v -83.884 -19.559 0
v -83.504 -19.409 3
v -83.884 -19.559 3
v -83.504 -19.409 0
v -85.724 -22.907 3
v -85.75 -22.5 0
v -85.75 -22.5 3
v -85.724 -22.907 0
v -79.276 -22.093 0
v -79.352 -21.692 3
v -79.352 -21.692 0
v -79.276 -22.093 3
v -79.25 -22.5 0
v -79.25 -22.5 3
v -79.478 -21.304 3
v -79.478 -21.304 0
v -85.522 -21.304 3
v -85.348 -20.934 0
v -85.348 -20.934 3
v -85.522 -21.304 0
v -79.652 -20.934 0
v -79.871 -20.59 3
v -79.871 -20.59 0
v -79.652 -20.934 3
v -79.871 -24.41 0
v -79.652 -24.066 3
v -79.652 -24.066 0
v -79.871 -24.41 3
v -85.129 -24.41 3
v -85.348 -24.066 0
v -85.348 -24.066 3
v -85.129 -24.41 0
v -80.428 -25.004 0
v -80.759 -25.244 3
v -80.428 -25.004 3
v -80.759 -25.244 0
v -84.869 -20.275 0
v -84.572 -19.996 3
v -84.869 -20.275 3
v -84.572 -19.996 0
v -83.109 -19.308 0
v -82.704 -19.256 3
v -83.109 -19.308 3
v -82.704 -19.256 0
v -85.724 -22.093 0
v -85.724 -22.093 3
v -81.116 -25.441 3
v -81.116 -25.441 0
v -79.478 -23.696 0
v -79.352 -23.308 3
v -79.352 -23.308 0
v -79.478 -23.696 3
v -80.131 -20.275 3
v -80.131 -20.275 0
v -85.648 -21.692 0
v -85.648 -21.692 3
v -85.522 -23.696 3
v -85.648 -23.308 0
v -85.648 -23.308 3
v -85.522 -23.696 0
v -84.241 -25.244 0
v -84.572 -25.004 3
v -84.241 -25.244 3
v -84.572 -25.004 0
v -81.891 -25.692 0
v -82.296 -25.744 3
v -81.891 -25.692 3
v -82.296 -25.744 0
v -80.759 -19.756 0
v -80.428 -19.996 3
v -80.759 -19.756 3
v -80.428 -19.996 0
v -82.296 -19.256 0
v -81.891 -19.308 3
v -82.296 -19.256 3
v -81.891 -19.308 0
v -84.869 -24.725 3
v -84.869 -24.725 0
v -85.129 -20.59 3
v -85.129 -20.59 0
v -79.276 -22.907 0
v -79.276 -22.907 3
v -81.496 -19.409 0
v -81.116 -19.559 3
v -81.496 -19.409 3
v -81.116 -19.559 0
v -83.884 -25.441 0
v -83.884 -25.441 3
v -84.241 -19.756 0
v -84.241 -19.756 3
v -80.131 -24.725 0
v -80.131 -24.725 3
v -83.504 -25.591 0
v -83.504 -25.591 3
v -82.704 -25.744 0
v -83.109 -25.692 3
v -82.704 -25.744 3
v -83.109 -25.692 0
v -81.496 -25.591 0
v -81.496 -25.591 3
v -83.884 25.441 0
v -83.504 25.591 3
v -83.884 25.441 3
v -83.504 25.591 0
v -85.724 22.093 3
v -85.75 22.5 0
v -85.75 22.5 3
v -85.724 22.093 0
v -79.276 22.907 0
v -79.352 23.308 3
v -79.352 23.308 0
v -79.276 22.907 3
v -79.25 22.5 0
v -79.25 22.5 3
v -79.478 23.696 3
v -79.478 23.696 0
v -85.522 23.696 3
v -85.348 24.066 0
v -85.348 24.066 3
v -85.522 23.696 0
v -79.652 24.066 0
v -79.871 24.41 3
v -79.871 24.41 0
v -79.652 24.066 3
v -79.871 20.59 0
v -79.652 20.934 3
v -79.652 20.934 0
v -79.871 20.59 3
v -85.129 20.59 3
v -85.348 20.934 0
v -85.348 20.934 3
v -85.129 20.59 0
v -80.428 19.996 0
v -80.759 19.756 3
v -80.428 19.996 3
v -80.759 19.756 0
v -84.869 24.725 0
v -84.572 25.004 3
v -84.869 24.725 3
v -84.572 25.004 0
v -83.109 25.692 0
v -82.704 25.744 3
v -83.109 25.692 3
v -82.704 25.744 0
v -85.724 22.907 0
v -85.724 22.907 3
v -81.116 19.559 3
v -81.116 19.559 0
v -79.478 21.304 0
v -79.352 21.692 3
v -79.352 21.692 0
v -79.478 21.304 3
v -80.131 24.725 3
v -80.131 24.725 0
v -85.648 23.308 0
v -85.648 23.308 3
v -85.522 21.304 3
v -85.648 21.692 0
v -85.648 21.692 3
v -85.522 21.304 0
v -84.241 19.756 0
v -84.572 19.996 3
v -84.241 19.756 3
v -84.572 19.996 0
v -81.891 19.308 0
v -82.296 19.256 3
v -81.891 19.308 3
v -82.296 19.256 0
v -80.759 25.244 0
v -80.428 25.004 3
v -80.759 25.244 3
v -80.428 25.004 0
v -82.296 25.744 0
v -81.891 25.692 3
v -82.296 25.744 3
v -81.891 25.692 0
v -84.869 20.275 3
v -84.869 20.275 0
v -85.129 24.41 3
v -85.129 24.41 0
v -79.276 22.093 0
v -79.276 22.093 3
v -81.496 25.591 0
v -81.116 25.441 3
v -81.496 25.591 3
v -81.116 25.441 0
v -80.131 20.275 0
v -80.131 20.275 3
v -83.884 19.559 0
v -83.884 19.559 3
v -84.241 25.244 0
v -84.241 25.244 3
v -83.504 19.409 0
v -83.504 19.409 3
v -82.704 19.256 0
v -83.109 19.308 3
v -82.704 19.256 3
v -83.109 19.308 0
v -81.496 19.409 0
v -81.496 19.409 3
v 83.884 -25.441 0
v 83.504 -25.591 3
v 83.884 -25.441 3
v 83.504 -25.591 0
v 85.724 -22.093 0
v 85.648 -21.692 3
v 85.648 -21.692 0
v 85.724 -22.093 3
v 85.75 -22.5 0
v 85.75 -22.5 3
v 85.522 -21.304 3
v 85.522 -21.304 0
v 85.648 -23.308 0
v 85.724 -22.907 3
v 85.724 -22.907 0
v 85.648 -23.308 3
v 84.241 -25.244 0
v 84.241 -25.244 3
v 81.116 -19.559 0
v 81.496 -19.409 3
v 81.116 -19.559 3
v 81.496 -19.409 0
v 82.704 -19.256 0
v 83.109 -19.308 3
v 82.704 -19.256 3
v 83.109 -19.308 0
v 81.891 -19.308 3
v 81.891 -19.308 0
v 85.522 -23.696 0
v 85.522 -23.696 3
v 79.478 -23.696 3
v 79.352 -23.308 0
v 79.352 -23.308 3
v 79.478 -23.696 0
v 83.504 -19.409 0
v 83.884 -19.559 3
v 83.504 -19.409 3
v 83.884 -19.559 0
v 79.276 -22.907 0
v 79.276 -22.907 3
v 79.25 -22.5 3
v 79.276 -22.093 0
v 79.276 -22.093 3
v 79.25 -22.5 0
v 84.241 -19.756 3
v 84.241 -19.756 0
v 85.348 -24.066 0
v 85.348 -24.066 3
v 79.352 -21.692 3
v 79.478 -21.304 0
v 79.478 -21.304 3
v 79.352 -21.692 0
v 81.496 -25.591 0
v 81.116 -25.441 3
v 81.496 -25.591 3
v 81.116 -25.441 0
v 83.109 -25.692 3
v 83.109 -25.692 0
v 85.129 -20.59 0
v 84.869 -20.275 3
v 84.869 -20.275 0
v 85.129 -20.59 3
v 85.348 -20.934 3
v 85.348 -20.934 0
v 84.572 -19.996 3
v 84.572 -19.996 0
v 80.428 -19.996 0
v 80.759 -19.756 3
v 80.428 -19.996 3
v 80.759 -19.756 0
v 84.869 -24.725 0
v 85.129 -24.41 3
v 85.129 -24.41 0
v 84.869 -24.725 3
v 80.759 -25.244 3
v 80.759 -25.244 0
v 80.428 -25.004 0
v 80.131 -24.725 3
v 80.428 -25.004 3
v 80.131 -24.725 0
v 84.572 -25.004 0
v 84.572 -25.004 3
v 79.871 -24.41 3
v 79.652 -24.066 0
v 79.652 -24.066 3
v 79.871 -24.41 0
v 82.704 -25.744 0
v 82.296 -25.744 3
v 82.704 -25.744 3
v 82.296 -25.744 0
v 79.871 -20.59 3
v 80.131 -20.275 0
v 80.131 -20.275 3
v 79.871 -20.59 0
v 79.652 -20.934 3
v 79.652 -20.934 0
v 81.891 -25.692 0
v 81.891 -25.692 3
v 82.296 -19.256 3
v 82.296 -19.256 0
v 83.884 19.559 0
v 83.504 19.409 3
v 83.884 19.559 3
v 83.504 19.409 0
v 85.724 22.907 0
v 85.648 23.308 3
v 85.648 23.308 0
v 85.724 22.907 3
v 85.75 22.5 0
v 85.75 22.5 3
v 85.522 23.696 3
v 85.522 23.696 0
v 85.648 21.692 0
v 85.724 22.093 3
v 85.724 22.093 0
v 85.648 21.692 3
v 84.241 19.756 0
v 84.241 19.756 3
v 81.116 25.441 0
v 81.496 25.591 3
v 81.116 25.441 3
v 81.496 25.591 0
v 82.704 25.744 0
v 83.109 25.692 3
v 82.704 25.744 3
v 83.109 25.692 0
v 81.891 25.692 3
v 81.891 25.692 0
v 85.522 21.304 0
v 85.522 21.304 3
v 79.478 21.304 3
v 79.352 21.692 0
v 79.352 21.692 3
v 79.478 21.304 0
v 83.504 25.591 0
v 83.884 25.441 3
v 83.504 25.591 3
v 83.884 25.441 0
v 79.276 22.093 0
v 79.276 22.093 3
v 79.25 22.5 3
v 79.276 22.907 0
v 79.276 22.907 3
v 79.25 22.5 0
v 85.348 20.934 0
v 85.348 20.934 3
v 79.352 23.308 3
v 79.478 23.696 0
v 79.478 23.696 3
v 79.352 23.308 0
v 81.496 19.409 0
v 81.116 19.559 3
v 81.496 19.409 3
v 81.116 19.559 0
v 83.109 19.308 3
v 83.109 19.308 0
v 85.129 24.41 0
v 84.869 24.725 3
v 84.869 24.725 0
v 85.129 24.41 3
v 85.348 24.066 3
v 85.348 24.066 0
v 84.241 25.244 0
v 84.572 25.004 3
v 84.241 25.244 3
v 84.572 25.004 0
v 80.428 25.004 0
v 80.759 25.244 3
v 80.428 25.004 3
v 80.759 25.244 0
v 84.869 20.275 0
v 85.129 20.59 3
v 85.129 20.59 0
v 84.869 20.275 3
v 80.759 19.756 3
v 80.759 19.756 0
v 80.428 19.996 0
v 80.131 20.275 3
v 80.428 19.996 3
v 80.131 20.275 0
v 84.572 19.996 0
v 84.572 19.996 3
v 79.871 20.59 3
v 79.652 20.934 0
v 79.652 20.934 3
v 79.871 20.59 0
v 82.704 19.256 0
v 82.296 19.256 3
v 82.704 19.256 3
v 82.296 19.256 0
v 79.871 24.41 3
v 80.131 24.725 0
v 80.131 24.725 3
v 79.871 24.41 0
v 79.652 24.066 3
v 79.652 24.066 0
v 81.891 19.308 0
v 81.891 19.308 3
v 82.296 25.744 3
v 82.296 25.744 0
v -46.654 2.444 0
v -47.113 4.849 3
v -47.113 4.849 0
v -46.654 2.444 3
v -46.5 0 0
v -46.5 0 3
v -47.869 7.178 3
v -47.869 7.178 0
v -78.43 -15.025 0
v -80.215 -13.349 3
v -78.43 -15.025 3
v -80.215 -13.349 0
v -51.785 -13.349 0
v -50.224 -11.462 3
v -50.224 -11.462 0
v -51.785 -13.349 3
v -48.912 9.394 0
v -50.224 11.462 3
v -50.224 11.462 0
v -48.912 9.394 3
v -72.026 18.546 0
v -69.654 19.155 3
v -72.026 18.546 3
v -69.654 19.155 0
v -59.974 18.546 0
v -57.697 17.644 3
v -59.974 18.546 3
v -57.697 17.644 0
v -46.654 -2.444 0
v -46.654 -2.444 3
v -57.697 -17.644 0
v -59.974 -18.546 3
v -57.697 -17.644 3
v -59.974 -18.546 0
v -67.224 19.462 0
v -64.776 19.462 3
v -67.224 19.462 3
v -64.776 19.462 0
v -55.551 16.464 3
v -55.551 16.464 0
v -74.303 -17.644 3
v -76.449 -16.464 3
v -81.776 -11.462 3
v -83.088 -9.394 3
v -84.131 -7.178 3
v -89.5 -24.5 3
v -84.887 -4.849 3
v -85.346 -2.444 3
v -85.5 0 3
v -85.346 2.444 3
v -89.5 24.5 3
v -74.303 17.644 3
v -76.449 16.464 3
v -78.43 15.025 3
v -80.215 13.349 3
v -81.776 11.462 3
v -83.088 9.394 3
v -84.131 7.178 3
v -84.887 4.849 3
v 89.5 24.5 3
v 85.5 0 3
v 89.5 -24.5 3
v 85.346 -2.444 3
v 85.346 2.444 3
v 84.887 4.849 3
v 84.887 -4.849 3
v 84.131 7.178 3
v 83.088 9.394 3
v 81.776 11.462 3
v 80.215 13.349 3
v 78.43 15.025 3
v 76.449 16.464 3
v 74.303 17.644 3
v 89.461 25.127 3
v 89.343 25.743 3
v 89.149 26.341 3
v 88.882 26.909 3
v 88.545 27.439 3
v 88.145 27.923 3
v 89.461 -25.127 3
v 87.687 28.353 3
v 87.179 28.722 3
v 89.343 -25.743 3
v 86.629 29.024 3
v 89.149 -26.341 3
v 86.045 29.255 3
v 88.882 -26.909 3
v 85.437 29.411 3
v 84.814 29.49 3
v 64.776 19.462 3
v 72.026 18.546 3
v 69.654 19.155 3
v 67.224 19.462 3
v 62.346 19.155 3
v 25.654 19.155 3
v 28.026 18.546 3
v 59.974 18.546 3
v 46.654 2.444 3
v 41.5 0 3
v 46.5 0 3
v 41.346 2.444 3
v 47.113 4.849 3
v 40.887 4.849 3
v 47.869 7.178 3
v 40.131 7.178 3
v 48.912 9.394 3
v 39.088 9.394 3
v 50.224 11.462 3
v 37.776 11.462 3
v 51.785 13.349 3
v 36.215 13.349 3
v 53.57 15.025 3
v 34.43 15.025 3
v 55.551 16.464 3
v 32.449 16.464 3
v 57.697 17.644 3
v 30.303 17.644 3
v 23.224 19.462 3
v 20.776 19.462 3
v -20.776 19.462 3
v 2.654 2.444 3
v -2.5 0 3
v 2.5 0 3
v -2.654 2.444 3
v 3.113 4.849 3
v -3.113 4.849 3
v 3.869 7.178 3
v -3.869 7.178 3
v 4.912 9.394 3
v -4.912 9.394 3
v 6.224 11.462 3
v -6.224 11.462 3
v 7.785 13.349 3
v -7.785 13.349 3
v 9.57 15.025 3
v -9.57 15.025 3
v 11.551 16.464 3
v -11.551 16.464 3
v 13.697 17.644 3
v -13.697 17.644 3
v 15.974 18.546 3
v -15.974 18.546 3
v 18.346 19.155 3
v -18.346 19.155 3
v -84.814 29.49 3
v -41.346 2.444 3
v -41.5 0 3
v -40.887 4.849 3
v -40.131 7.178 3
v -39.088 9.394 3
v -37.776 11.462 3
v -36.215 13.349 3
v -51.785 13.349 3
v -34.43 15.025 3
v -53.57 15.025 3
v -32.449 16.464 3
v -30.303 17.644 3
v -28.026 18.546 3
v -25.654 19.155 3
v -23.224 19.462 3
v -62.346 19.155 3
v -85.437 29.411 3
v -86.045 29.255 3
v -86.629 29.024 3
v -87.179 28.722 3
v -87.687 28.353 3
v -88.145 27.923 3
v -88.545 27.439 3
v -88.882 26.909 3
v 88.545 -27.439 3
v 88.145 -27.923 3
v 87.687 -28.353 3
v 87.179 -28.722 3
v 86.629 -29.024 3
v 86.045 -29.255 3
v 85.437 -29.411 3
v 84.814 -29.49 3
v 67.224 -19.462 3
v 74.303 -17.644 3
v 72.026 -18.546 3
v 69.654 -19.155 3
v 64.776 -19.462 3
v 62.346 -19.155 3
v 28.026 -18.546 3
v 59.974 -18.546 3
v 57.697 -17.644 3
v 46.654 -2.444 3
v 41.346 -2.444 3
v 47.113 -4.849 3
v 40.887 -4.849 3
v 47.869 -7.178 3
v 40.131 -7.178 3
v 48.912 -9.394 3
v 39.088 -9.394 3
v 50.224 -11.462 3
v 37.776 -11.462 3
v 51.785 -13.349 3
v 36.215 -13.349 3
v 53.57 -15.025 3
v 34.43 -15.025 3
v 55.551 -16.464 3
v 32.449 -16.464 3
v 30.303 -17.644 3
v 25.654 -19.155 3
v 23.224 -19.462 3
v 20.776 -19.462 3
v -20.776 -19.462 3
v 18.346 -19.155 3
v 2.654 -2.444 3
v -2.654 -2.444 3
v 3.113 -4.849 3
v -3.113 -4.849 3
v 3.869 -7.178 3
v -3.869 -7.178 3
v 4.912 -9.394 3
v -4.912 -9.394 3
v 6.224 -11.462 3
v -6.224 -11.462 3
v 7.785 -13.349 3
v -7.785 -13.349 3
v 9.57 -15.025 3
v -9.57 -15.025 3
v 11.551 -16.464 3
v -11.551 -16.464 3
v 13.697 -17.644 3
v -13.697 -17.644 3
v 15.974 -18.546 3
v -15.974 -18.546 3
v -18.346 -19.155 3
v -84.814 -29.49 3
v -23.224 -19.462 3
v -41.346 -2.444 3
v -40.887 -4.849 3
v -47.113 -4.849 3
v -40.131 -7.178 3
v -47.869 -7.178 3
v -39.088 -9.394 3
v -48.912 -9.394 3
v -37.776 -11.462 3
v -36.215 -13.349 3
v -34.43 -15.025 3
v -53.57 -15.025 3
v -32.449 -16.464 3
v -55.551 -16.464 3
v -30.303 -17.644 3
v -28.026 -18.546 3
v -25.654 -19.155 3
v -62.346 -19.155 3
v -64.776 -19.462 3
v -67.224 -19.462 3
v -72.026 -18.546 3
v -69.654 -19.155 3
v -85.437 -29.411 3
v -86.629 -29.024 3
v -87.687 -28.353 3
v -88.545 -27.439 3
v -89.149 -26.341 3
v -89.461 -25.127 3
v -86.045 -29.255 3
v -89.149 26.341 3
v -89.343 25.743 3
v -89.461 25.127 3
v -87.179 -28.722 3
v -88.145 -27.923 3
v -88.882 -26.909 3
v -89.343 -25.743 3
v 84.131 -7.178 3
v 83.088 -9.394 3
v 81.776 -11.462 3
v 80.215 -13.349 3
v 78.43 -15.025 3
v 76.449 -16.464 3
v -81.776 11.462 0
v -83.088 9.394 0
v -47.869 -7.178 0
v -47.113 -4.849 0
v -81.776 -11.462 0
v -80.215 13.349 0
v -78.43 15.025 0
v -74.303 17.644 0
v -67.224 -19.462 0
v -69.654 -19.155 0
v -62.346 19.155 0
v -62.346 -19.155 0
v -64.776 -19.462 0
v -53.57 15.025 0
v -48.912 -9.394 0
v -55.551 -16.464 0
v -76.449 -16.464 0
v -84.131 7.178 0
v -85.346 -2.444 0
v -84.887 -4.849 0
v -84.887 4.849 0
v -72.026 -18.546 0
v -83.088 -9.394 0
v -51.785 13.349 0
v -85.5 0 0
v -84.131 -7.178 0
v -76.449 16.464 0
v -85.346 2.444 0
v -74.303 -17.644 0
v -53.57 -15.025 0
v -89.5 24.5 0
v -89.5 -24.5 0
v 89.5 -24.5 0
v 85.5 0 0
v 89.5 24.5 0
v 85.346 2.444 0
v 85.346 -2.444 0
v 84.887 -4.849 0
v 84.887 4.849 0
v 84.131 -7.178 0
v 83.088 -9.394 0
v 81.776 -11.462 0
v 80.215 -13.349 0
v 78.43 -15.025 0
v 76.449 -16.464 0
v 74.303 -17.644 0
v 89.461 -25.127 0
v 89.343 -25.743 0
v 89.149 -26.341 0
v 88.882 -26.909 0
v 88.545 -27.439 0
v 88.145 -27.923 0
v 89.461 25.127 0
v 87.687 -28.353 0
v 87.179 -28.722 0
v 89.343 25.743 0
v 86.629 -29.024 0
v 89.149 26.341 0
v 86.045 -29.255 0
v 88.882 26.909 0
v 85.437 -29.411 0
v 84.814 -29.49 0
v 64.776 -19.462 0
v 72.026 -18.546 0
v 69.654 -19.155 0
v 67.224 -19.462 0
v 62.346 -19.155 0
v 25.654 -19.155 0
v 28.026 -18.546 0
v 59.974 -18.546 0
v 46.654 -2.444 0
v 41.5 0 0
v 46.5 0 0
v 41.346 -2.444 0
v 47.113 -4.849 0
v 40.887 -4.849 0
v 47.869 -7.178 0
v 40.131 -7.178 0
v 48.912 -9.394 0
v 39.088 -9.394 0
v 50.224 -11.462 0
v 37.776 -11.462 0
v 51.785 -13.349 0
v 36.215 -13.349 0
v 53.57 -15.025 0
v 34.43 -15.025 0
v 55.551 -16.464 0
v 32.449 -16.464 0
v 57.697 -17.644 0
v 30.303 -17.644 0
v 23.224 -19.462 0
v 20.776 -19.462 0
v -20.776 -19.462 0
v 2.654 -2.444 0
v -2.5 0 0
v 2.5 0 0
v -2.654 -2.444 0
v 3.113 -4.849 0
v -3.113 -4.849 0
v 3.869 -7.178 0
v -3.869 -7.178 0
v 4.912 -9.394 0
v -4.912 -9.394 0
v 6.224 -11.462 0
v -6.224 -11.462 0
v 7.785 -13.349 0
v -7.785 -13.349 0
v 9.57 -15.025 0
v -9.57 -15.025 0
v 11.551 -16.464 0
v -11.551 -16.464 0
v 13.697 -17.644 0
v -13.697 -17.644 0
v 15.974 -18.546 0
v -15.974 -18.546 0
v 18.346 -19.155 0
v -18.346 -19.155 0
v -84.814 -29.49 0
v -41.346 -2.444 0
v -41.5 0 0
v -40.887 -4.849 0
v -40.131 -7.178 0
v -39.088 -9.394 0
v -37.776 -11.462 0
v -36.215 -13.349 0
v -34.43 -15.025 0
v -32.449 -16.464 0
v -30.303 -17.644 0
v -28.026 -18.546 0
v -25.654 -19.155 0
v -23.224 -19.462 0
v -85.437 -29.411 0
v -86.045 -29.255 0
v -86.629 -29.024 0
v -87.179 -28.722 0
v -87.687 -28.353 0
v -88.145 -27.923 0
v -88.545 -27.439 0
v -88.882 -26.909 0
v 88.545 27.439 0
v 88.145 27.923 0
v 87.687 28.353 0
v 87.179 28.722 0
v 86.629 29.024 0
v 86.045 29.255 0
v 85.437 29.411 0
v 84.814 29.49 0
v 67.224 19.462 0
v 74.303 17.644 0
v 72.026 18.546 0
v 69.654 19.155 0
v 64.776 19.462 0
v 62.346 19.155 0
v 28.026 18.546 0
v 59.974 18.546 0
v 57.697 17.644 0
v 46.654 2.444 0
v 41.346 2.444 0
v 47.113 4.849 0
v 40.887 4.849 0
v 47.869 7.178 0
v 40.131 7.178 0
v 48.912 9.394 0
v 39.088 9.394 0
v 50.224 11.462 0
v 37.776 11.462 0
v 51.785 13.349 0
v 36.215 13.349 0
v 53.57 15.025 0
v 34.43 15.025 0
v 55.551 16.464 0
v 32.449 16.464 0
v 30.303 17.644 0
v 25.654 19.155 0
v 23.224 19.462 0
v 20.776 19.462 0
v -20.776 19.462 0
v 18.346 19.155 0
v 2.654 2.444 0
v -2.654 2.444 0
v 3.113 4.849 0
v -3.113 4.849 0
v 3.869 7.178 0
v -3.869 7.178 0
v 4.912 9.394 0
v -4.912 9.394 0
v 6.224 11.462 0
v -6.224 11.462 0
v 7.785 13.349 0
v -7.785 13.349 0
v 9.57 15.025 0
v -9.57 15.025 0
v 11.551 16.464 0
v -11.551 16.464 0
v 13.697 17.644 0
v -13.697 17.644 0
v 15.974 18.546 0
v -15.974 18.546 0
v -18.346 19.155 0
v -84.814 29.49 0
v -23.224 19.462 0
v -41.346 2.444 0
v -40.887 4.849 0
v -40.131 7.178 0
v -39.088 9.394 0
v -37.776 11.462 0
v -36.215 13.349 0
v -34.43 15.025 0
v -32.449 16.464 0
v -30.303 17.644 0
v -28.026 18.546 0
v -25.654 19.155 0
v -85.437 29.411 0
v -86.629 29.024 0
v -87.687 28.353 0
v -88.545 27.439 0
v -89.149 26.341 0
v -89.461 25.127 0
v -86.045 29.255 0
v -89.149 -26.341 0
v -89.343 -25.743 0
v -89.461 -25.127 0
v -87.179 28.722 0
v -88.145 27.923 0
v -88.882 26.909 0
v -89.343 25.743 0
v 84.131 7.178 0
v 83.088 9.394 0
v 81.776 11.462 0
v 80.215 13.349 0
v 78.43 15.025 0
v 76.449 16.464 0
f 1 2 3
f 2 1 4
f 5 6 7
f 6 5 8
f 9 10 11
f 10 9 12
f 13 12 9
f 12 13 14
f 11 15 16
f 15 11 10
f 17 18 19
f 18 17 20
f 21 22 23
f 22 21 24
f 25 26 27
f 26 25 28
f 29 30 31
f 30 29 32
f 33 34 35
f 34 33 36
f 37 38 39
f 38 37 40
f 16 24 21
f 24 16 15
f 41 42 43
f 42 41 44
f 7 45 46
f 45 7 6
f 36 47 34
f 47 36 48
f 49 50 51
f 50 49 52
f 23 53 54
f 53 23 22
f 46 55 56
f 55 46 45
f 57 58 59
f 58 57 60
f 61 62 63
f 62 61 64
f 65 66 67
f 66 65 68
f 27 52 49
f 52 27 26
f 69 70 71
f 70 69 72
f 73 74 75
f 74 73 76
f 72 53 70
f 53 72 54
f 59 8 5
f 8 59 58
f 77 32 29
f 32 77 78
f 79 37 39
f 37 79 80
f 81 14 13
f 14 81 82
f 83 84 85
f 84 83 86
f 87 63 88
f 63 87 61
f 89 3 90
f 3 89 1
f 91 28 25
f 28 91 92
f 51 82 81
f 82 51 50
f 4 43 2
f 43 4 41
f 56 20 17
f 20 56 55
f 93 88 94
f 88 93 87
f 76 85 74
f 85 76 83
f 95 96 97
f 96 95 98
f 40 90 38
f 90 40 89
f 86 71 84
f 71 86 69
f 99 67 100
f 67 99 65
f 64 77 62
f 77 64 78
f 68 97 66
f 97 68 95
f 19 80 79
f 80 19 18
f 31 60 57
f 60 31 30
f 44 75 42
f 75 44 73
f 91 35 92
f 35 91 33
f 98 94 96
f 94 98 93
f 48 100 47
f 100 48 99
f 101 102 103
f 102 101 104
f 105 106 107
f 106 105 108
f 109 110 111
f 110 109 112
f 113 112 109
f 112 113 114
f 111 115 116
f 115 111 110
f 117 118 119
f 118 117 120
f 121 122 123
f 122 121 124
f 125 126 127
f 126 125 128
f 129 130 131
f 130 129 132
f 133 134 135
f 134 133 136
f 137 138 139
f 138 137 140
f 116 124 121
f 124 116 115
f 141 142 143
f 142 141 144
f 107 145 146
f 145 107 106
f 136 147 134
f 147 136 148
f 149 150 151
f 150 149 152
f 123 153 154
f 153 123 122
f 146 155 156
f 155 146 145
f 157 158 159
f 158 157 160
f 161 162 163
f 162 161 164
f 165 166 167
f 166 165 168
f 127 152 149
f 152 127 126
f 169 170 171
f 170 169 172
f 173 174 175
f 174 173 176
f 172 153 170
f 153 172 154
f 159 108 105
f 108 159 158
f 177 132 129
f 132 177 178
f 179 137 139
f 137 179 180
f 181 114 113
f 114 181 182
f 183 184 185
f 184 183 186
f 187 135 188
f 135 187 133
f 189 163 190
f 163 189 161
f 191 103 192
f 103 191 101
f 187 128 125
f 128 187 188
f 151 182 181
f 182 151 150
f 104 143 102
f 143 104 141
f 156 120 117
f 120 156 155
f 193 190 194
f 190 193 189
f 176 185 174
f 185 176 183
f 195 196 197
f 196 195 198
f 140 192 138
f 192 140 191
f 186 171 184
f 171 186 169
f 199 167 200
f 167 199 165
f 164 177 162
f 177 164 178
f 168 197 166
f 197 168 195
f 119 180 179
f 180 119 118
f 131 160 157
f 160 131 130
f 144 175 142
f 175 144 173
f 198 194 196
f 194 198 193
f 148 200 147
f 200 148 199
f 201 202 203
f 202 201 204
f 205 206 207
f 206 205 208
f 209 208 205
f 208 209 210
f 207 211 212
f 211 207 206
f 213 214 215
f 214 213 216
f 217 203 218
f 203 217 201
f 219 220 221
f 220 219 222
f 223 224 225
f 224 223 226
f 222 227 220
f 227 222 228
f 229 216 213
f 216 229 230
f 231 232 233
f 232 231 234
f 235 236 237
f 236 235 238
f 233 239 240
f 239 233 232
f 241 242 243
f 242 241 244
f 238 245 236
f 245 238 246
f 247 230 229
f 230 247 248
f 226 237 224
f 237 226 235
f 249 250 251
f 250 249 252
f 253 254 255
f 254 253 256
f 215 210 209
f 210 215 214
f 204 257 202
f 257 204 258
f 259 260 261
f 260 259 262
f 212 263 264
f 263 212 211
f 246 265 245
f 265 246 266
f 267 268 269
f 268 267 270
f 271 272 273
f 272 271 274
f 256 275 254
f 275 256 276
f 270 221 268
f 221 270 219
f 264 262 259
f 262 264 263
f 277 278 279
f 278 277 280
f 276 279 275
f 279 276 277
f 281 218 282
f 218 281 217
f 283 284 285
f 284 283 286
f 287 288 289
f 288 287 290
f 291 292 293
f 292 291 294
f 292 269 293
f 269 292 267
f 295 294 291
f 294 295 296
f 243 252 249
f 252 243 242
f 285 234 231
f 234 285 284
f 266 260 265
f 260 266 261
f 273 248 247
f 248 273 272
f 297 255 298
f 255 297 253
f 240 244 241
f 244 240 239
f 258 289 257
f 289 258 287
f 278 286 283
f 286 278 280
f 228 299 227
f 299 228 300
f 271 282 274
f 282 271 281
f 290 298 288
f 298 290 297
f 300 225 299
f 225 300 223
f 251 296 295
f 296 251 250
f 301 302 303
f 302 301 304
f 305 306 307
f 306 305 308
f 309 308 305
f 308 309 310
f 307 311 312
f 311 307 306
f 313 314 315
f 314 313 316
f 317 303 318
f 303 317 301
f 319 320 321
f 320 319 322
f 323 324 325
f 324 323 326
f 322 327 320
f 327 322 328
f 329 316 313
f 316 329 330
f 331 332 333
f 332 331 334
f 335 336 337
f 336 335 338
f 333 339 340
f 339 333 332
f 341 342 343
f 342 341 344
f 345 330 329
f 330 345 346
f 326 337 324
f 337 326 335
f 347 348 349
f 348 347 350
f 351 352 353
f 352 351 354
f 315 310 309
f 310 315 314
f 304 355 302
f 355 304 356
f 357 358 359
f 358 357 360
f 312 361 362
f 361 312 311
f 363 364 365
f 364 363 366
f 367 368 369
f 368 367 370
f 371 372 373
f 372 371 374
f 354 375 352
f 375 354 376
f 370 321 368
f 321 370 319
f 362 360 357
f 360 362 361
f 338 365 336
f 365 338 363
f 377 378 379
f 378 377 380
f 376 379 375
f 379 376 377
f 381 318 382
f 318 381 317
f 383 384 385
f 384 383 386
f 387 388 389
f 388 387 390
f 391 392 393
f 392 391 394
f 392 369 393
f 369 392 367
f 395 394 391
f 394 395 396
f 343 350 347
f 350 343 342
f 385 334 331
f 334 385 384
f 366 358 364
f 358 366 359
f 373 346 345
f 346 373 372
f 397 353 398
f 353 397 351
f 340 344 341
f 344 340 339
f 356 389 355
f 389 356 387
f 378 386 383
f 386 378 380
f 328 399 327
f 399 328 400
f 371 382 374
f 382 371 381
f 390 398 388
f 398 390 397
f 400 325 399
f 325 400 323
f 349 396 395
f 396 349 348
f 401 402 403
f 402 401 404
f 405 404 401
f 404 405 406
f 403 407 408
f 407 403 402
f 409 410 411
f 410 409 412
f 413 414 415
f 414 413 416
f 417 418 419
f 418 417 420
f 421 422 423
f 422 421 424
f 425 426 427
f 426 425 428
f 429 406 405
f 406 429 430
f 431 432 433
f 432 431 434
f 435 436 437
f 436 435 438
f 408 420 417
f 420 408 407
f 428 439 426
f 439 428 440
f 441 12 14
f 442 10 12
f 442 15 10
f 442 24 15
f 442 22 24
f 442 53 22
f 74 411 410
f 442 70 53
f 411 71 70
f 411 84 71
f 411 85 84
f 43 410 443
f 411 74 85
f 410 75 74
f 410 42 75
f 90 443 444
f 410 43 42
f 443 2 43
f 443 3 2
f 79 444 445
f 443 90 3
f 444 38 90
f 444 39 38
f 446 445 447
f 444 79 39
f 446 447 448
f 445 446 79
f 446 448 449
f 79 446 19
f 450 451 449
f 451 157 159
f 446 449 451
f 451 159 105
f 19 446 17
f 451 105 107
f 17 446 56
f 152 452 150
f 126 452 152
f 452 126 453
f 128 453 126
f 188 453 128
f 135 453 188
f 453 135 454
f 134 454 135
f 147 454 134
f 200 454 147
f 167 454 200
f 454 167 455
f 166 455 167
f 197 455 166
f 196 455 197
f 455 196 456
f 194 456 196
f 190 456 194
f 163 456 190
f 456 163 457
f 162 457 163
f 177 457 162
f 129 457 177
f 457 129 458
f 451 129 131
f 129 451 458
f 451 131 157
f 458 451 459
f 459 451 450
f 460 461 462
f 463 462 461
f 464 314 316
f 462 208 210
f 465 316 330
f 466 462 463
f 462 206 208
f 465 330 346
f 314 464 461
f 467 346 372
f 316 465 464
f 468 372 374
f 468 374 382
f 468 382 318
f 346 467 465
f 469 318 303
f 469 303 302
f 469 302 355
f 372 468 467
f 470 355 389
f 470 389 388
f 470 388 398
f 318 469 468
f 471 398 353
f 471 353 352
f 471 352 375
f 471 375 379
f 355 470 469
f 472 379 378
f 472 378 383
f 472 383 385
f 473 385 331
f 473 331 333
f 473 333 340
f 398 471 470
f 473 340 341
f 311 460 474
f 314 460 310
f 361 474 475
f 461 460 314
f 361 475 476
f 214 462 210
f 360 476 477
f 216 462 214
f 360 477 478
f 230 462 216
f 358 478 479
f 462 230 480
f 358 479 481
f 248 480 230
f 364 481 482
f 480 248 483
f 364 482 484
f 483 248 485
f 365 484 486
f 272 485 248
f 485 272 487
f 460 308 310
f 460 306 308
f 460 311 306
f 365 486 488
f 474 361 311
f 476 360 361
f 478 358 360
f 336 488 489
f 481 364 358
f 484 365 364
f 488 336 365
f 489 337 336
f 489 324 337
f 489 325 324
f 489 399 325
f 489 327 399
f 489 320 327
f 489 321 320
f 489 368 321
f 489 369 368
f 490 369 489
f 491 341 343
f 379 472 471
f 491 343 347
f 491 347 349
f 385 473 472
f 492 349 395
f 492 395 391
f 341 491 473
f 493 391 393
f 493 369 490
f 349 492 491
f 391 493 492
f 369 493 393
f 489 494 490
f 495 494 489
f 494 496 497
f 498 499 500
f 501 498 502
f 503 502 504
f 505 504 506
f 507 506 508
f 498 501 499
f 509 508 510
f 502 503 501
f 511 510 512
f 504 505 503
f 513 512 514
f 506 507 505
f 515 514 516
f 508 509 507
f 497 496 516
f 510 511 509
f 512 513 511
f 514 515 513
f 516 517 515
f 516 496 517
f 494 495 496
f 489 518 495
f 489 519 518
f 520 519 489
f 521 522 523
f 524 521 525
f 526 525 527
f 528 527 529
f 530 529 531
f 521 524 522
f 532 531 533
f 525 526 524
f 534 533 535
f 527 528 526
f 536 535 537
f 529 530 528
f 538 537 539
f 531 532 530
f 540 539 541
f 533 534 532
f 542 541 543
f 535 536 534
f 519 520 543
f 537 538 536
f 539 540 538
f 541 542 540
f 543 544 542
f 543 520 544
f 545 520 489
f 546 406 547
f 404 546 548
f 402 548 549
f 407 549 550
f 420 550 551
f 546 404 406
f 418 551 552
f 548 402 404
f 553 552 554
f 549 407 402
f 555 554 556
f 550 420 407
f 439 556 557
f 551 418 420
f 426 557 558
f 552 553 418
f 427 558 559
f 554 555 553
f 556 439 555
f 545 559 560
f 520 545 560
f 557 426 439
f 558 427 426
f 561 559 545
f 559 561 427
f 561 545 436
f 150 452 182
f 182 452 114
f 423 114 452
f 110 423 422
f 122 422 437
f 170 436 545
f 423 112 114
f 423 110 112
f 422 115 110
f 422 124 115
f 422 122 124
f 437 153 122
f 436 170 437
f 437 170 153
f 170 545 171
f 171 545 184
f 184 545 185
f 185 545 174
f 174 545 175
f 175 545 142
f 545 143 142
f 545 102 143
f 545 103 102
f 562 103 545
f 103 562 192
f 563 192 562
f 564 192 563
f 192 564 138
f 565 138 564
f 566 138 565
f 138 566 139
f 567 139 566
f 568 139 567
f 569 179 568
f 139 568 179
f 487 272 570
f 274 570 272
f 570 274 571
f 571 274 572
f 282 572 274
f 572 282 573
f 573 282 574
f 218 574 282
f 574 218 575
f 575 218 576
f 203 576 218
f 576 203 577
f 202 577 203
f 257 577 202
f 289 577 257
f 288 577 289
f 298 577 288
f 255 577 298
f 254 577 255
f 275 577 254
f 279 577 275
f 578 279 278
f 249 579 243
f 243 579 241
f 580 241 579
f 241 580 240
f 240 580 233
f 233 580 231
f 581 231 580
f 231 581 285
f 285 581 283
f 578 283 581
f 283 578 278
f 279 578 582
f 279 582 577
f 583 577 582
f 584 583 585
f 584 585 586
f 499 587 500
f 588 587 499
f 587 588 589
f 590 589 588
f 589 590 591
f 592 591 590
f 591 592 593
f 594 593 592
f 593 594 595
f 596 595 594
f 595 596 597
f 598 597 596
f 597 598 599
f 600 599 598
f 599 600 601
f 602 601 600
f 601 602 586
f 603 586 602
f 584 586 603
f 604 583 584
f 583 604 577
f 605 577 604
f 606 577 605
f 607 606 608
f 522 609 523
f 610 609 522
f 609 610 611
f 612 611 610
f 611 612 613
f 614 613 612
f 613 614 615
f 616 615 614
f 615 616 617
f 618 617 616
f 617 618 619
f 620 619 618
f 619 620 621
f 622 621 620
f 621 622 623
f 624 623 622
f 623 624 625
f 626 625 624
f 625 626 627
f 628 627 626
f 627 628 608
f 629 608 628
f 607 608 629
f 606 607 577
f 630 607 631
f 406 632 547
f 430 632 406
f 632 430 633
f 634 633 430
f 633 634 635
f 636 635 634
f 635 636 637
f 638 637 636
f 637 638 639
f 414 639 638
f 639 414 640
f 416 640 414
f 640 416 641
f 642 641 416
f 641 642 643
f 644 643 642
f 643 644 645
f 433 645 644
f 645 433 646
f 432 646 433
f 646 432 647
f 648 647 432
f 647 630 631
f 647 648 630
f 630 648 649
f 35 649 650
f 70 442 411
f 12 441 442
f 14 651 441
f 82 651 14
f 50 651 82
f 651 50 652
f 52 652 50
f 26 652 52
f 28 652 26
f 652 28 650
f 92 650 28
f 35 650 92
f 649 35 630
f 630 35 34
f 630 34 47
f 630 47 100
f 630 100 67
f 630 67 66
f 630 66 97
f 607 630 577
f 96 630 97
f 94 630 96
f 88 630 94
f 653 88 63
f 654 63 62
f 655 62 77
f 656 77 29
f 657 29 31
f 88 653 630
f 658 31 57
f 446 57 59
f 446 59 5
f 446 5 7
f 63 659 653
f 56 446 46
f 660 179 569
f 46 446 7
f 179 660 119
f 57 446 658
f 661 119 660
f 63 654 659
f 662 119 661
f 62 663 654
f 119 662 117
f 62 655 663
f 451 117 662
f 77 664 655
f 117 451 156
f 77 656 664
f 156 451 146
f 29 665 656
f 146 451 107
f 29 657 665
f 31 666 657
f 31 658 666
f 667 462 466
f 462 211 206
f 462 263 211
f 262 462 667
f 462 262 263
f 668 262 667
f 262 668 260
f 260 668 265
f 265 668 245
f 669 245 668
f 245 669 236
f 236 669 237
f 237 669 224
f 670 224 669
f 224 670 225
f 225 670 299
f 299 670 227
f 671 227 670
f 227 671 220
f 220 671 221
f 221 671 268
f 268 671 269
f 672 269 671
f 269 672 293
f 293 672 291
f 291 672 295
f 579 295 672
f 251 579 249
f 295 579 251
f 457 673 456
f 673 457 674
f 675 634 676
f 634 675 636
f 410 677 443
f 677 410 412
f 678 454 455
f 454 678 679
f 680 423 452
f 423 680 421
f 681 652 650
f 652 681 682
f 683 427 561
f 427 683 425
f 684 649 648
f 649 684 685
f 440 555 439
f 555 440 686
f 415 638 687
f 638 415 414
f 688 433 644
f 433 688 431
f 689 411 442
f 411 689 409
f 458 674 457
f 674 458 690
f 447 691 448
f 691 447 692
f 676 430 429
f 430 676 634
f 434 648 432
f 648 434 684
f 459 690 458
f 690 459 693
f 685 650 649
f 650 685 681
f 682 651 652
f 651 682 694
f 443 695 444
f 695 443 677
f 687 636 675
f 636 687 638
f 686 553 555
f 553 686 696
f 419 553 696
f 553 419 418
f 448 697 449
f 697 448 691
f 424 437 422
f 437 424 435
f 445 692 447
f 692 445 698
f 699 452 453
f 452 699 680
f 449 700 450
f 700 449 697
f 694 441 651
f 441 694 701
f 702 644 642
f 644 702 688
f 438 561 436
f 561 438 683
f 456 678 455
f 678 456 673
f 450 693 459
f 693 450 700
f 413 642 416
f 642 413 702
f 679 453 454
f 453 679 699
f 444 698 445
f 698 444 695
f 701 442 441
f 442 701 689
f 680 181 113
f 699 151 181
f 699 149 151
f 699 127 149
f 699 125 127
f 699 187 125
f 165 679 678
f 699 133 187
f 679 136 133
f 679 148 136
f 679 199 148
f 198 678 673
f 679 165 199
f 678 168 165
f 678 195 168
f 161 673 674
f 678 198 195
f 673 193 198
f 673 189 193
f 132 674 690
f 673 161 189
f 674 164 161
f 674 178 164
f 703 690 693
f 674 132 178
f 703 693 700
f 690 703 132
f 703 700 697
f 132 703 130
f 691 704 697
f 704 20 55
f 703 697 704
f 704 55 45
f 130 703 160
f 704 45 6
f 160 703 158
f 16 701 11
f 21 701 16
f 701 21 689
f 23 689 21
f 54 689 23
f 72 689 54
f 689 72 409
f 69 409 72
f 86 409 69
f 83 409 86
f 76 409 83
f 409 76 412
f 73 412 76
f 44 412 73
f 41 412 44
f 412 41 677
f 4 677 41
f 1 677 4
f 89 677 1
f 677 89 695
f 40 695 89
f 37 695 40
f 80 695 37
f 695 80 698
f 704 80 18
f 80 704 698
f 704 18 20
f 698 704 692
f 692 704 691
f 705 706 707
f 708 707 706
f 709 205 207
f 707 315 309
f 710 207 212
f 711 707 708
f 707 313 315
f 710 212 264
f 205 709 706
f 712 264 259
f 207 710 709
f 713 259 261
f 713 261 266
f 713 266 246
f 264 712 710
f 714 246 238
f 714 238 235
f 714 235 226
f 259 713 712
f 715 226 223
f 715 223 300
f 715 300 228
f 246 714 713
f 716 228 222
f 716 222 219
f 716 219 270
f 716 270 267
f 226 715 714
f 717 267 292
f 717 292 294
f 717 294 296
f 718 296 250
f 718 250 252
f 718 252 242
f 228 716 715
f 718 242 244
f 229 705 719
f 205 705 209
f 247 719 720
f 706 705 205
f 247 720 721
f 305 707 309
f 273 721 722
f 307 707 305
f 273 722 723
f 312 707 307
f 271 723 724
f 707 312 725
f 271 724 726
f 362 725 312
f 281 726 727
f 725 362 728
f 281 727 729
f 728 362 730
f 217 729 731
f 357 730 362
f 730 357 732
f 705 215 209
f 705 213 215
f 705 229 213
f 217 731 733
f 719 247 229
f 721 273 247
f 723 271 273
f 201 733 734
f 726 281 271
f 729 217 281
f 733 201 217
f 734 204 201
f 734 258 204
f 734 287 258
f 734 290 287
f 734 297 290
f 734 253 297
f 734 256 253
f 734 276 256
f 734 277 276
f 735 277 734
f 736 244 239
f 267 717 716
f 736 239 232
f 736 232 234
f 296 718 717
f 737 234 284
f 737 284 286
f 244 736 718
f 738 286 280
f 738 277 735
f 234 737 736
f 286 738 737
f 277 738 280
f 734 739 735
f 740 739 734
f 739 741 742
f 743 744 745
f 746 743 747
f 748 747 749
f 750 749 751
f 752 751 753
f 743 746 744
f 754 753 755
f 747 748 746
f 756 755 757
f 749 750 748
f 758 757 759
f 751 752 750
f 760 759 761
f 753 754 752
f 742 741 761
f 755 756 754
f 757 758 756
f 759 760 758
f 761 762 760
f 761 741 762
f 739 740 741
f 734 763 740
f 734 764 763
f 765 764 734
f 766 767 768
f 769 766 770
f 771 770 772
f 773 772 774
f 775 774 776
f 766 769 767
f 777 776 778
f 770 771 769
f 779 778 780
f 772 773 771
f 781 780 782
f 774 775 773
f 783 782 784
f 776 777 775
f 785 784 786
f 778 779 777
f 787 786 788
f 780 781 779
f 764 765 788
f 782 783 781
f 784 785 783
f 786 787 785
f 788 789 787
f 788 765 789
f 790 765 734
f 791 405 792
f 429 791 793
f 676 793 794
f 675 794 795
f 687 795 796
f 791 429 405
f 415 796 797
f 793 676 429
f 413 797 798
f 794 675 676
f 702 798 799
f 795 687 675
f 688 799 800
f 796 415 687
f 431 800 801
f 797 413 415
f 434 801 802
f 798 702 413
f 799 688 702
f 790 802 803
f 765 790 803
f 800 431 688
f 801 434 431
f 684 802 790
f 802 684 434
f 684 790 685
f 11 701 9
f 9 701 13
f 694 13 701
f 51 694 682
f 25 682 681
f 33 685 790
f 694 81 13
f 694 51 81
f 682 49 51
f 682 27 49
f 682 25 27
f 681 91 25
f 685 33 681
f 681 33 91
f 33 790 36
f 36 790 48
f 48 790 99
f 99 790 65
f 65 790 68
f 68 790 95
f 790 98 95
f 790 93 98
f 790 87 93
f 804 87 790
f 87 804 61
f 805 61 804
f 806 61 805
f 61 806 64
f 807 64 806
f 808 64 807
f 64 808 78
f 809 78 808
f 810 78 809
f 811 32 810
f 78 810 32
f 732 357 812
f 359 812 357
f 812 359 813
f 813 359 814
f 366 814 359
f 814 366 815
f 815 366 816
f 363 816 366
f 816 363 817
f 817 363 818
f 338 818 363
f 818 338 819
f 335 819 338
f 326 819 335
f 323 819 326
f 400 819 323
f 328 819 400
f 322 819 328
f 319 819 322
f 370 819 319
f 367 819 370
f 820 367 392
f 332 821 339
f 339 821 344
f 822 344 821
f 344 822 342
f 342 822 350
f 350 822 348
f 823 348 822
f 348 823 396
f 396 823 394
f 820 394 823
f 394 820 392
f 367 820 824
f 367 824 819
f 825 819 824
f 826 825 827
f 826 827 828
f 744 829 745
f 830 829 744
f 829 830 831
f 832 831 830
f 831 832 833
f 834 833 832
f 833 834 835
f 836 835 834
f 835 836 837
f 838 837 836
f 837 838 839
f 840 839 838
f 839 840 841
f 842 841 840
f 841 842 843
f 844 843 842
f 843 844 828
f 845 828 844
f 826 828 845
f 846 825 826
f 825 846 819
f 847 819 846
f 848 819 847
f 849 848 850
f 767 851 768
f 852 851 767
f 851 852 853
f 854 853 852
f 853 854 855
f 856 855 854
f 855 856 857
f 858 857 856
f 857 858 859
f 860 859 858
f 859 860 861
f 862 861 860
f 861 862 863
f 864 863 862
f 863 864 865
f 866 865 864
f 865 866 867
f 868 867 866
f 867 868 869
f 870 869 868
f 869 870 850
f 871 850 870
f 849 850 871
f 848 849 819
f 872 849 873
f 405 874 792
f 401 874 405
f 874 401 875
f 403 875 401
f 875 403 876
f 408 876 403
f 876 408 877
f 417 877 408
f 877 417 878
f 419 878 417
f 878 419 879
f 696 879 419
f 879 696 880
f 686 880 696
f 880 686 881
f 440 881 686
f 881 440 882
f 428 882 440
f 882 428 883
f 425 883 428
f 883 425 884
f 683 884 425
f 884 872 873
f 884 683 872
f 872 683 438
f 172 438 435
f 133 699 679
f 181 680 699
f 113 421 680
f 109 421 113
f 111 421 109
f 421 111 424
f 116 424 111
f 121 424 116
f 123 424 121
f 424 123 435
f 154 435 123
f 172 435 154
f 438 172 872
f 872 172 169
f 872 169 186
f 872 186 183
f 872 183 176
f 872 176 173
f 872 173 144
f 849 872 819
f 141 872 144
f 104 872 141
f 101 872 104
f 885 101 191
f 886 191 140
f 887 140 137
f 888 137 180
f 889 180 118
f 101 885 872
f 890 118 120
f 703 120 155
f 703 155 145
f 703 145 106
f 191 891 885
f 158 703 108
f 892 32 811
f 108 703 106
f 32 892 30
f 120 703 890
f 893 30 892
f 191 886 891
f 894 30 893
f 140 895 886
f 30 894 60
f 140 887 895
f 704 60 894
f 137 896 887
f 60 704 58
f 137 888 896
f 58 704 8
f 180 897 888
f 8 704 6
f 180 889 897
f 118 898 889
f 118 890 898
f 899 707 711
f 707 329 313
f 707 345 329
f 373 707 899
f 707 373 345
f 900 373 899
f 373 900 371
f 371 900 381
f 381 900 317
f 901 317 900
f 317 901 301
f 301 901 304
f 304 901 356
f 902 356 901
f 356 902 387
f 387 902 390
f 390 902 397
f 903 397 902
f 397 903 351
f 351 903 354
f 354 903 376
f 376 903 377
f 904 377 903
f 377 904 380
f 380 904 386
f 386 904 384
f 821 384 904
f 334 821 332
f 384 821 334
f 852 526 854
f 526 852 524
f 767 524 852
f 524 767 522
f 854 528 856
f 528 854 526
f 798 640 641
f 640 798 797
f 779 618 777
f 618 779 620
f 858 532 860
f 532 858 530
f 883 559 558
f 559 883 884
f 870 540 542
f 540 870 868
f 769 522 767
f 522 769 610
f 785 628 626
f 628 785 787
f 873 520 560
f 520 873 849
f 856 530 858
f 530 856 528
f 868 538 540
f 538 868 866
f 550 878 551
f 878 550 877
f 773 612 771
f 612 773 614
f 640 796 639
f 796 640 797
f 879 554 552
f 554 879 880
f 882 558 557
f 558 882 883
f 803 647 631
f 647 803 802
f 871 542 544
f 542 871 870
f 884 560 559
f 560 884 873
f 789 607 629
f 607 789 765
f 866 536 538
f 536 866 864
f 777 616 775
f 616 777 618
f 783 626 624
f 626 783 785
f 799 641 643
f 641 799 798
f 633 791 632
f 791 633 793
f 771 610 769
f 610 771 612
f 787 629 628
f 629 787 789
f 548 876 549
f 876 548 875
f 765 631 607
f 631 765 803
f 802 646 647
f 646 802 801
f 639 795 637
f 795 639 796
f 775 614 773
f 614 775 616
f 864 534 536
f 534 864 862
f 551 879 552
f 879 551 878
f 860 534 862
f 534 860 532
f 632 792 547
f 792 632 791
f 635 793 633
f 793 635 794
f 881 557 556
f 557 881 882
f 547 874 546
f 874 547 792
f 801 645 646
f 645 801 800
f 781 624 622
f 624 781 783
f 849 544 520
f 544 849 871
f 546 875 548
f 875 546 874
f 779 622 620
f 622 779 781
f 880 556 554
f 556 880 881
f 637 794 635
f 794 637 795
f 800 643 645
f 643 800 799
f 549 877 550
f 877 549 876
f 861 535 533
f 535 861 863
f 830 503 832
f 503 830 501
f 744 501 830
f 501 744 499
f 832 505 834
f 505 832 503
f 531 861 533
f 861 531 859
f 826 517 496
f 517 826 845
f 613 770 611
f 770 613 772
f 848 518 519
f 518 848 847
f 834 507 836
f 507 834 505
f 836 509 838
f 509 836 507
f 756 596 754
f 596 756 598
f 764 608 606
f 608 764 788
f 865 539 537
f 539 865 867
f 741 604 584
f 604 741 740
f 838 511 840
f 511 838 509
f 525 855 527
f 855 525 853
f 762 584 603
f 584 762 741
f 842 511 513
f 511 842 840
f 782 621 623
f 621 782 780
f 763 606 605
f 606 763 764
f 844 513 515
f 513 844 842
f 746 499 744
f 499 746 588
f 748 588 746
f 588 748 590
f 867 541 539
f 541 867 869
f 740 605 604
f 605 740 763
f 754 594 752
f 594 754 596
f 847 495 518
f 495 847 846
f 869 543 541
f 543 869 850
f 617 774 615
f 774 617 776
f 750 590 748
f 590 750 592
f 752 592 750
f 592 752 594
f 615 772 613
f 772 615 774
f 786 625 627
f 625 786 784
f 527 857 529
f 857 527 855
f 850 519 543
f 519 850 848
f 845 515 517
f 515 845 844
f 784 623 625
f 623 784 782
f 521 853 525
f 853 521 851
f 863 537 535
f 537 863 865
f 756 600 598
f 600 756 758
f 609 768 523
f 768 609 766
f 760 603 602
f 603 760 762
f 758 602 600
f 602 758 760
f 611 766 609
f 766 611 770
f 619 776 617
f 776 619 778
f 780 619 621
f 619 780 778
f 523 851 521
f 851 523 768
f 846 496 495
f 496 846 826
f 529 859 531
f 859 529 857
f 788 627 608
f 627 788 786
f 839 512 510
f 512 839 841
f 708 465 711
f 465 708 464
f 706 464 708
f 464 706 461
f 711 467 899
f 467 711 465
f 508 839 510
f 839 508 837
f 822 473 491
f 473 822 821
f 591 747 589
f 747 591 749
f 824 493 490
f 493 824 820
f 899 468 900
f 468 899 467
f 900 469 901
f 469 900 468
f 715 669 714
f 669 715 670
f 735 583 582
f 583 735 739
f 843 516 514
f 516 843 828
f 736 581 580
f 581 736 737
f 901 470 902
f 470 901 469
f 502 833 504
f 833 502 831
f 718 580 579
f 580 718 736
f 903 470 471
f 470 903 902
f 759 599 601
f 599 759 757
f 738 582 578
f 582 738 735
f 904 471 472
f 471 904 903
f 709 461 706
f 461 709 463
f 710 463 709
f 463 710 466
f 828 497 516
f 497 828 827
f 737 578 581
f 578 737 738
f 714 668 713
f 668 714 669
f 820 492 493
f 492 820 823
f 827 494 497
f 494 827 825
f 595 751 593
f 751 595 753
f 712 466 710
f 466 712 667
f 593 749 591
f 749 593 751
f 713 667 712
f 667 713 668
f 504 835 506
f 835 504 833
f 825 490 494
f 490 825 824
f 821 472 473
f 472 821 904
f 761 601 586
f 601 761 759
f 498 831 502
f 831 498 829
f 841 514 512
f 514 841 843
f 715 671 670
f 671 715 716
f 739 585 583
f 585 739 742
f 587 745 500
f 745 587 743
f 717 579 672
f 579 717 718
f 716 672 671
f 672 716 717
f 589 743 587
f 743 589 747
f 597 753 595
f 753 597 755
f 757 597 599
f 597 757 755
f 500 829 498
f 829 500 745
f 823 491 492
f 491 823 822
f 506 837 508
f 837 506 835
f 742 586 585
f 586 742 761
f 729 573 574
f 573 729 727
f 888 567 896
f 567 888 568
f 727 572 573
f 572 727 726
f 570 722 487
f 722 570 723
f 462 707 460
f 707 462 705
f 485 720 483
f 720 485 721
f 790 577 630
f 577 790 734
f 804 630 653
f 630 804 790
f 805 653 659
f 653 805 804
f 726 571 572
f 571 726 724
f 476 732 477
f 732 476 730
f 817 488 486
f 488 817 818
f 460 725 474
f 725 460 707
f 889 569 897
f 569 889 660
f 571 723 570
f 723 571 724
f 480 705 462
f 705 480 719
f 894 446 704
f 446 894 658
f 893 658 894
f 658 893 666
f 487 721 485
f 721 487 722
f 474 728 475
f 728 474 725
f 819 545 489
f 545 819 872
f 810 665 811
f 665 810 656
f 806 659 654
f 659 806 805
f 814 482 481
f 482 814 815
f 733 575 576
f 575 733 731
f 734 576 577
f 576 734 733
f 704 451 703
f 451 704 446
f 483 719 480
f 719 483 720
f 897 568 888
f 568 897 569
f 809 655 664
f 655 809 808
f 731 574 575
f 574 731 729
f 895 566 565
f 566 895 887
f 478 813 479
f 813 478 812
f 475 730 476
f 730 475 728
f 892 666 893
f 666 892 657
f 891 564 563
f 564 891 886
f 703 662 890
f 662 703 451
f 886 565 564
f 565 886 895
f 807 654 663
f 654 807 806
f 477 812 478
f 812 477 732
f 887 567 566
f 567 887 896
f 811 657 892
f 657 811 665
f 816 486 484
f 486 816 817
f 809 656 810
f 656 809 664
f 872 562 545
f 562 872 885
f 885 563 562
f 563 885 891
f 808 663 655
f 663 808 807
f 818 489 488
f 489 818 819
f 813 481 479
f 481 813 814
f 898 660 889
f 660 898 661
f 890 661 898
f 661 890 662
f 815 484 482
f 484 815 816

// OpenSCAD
$fn = 50;


difference() {
	union() {
		hull() {
			translate(v = [-84.5000000000, 24.5000000000, 0]) {
				cylinder(h = 3, r = 5);
			}
			translate(v = [84.5000000000, 24.5000000000, 0]) {
				cylinder(h = 3, r = 5);
			}
			translate(v = [-84.5000000000, -24.5000000000, 0]) {
				cylinder(h = 3, r = 5);
			}
			translate(v = [84.5000000000, -24.5000000000, 0]) {
				cylinder(h = 3, r = 5);
			}
		}
	}
	union() {
		#translate(v = [-82.5000000000, -22.5000000000, -100.0000000000]) {
			cylinder(h = 200, r = 3.2500000000);
		}
		#translate(v = [-82.5000000000, 22.5000000000, -100.0000000000]) {
			cylinder(h = 200, r = 3.2500000000);
		}
		#translate(v = [82.5000000000, -22.5000000000, -100.0000000000]) {
			cylinder(h = 200, r = 3.2500000000);
		}
		#translate(v = [82.5000000000, 22.5000000000, -100.0000000000]) {
			cylinder(h = 200, r = 3.2500000000);
		}
		#translate(v = [-66.0000000000, 0, 0]) {
			cylinder(h = 3, r = 19.5000000000);
		}
		#translate(v = [-22.0000000000, 0, 0]) {
			cylinder(h = 3, r = 19.5000000000);
		}
		#translate(v = [22.0000000000, 0, 0]) {
			cylinder(h = 3, r = 19.5000000000);
		}
		#translate(v = [66.0000000000, 0, 0]) {
			cylinder(h = 3, r = 19.5000000000);
		}
	}
}
